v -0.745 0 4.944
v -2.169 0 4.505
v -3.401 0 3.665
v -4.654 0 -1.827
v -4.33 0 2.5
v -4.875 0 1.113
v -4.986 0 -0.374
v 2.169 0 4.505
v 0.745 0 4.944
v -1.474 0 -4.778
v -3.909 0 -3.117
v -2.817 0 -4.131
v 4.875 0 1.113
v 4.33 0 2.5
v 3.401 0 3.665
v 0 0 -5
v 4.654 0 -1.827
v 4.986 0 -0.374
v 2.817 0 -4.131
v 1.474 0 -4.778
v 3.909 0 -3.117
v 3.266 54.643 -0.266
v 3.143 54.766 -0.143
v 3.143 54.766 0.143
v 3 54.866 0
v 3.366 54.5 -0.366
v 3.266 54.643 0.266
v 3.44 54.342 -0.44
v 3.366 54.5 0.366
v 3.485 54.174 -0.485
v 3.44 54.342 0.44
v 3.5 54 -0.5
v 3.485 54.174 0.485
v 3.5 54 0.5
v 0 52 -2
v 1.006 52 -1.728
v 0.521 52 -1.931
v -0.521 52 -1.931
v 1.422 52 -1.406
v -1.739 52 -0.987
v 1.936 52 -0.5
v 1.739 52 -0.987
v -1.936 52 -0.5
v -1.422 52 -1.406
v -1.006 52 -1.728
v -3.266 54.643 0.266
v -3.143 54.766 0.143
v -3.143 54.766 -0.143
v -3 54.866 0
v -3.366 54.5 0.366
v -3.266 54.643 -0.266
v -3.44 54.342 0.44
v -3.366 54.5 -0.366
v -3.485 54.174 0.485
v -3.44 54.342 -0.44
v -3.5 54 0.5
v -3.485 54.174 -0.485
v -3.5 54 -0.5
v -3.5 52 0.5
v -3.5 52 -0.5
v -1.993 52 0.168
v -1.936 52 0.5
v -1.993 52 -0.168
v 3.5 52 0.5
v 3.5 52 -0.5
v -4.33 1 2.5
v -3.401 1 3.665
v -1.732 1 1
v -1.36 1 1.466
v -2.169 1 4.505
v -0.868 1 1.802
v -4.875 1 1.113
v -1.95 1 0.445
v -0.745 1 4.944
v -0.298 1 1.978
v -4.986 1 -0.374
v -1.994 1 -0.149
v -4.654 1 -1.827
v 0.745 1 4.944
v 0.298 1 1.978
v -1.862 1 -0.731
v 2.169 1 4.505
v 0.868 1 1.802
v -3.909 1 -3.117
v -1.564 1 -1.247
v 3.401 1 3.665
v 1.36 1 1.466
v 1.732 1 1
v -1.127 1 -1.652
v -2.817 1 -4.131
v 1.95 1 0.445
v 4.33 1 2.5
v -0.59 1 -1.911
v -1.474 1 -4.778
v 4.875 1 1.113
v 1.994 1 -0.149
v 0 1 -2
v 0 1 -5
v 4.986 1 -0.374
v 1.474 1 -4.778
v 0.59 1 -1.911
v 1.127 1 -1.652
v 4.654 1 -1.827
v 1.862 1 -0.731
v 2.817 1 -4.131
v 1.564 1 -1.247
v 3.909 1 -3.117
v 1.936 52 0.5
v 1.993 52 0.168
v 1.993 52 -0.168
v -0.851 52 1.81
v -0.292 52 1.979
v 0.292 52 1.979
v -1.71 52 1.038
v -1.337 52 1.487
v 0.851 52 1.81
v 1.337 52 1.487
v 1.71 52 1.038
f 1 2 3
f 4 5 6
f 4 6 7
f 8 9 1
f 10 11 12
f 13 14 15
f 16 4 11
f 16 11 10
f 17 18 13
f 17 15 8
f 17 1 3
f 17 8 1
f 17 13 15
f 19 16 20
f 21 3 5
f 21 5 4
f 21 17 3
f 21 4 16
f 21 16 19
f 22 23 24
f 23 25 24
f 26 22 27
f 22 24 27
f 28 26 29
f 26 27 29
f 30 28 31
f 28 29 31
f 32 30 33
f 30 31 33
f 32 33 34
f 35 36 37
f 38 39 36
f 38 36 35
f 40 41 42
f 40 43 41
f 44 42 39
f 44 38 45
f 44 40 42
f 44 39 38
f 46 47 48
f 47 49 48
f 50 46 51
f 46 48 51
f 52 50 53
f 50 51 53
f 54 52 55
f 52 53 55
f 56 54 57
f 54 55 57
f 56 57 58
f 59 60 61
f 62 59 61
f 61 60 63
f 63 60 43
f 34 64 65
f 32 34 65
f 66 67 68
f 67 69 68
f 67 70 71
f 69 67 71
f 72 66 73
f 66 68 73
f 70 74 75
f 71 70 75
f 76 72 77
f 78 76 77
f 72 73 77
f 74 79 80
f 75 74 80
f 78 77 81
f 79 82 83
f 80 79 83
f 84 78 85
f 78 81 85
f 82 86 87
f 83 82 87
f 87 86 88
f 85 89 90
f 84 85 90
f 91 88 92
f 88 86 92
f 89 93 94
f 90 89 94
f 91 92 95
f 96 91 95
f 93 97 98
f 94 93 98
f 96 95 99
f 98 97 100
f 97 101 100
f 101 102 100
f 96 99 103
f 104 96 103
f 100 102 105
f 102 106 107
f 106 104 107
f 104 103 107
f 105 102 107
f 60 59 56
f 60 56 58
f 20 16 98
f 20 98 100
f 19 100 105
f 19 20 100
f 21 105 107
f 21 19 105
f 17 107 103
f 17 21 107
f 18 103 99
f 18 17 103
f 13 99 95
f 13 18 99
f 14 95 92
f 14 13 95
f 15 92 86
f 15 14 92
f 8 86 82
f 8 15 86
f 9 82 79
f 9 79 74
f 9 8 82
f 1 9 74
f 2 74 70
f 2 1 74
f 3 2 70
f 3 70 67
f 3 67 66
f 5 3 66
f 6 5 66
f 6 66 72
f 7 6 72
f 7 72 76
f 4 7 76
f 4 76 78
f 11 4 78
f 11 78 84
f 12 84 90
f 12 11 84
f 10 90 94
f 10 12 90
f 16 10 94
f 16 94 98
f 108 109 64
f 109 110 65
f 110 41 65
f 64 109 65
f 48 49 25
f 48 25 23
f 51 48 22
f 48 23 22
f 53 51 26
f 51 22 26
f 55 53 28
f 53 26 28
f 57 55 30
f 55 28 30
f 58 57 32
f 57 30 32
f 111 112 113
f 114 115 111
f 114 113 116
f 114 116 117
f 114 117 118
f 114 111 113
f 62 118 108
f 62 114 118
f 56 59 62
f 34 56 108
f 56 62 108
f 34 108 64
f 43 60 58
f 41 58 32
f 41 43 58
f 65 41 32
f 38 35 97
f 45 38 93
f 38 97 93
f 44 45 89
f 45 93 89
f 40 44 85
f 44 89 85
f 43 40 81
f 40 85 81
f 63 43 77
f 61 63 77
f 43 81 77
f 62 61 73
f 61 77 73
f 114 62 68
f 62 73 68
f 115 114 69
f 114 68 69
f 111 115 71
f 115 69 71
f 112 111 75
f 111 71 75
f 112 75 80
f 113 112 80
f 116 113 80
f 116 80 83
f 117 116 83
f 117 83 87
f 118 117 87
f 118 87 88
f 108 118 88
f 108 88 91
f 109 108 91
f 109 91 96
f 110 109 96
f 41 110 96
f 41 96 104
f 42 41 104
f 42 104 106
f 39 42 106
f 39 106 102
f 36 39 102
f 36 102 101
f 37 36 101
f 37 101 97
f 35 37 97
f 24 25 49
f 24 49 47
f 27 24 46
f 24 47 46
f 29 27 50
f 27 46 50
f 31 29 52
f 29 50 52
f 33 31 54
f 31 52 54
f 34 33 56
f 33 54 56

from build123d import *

# Parameters (mm, degrees)
SKETCH1_R           = 2
BOSS_EXTRUDE1_DEPTH = 52
SKETCH2_R           = 5
BOSS_EXTRUDE2_DEPTH = 1
SKETCH3_W           = 7
SKETCH3_H           = 1
BOSS_EXTRUDE3_DEPTH = 3
FILLET1_R           = 1


with BuildPart() as part:
    # Sketch1 → Boss-Extrude1 (new body)
    with BuildSketch(Plane(origin=(0, 0, 0), x_dir=(1, 0, 0), z_dir=(0, 1, 0))):
        with Locations(Location((0, 0, 0), (0, 0, 90))):
            Circle(SKETCH1_R)
    extrude(amount=BOSS_EXTRUDE1_DEPTH)

    # Sketch2 → Boss-Extrude2 (add)
    with BuildSketch(Plane.XZ):
        with Locations(Location((0, 0, 0), (0, 0, 270))):
            Circle(SKETCH2_R)
    extrude(amount=-BOSS_EXTRUDE2_DEPTH)

    # Sketch3 → Boss-Extrude3 (add)
    with BuildSketch(Plane(origin=(0, 52, 0), x_dir=(1, 0, 0), z_dir=(0, 1, 0))):
        Rectangle(SKETCH3_W, SKETCH3_H)
    extrude(amount=BOSS_EXTRUDE3_DEPTH)

    # Fillet1
    # the kernel refuses this fillet: 1 mm, written as the material it takes off along each edge
    with BuildSketch(Plane(origin=(3.5, 55, 3), x_dir=(0, -1, 0), z_dir=(0, 0, -1)), Plane(origin=(-3.5, 55, -3), x_dir=(0, -1, 0), z_dir=(0, 0, 1))) as fillet1_piece_1:
        with BuildLine():
            CenterArc((FILLET1_R, FILLET1_R), FILLET1_R, 180, 90)
            Line((0, FILLET1_R), (0, 0))
            Line((0, 0), (FILLET1_R, 0))
        make_face()
    extrude(amount=6, mode=Mode.SUBTRACT)
    with BuildSketch(Plane(origin=(6, 55, -0.5), x_dir=(0, -1, 0), z_dir=(-1, 0, 0)), Plane(origin=(-6, 55, 0.5), x_dir=(0, -1, 0), z_dir=(1, 0, 0))) as fillet1_piece_2:
        with BuildLine():
            CenterArc((FILLET1_R, FILLET1_R), FILLET1_R, 180, 90)
            Line((0, FILLET1_R), (0, 0))
            Line((0, 0), (FILLET1_R, 0))
        make_face()
    extrude(amount=12, mode=Mode.SUBTRACT)


solid = part.part
